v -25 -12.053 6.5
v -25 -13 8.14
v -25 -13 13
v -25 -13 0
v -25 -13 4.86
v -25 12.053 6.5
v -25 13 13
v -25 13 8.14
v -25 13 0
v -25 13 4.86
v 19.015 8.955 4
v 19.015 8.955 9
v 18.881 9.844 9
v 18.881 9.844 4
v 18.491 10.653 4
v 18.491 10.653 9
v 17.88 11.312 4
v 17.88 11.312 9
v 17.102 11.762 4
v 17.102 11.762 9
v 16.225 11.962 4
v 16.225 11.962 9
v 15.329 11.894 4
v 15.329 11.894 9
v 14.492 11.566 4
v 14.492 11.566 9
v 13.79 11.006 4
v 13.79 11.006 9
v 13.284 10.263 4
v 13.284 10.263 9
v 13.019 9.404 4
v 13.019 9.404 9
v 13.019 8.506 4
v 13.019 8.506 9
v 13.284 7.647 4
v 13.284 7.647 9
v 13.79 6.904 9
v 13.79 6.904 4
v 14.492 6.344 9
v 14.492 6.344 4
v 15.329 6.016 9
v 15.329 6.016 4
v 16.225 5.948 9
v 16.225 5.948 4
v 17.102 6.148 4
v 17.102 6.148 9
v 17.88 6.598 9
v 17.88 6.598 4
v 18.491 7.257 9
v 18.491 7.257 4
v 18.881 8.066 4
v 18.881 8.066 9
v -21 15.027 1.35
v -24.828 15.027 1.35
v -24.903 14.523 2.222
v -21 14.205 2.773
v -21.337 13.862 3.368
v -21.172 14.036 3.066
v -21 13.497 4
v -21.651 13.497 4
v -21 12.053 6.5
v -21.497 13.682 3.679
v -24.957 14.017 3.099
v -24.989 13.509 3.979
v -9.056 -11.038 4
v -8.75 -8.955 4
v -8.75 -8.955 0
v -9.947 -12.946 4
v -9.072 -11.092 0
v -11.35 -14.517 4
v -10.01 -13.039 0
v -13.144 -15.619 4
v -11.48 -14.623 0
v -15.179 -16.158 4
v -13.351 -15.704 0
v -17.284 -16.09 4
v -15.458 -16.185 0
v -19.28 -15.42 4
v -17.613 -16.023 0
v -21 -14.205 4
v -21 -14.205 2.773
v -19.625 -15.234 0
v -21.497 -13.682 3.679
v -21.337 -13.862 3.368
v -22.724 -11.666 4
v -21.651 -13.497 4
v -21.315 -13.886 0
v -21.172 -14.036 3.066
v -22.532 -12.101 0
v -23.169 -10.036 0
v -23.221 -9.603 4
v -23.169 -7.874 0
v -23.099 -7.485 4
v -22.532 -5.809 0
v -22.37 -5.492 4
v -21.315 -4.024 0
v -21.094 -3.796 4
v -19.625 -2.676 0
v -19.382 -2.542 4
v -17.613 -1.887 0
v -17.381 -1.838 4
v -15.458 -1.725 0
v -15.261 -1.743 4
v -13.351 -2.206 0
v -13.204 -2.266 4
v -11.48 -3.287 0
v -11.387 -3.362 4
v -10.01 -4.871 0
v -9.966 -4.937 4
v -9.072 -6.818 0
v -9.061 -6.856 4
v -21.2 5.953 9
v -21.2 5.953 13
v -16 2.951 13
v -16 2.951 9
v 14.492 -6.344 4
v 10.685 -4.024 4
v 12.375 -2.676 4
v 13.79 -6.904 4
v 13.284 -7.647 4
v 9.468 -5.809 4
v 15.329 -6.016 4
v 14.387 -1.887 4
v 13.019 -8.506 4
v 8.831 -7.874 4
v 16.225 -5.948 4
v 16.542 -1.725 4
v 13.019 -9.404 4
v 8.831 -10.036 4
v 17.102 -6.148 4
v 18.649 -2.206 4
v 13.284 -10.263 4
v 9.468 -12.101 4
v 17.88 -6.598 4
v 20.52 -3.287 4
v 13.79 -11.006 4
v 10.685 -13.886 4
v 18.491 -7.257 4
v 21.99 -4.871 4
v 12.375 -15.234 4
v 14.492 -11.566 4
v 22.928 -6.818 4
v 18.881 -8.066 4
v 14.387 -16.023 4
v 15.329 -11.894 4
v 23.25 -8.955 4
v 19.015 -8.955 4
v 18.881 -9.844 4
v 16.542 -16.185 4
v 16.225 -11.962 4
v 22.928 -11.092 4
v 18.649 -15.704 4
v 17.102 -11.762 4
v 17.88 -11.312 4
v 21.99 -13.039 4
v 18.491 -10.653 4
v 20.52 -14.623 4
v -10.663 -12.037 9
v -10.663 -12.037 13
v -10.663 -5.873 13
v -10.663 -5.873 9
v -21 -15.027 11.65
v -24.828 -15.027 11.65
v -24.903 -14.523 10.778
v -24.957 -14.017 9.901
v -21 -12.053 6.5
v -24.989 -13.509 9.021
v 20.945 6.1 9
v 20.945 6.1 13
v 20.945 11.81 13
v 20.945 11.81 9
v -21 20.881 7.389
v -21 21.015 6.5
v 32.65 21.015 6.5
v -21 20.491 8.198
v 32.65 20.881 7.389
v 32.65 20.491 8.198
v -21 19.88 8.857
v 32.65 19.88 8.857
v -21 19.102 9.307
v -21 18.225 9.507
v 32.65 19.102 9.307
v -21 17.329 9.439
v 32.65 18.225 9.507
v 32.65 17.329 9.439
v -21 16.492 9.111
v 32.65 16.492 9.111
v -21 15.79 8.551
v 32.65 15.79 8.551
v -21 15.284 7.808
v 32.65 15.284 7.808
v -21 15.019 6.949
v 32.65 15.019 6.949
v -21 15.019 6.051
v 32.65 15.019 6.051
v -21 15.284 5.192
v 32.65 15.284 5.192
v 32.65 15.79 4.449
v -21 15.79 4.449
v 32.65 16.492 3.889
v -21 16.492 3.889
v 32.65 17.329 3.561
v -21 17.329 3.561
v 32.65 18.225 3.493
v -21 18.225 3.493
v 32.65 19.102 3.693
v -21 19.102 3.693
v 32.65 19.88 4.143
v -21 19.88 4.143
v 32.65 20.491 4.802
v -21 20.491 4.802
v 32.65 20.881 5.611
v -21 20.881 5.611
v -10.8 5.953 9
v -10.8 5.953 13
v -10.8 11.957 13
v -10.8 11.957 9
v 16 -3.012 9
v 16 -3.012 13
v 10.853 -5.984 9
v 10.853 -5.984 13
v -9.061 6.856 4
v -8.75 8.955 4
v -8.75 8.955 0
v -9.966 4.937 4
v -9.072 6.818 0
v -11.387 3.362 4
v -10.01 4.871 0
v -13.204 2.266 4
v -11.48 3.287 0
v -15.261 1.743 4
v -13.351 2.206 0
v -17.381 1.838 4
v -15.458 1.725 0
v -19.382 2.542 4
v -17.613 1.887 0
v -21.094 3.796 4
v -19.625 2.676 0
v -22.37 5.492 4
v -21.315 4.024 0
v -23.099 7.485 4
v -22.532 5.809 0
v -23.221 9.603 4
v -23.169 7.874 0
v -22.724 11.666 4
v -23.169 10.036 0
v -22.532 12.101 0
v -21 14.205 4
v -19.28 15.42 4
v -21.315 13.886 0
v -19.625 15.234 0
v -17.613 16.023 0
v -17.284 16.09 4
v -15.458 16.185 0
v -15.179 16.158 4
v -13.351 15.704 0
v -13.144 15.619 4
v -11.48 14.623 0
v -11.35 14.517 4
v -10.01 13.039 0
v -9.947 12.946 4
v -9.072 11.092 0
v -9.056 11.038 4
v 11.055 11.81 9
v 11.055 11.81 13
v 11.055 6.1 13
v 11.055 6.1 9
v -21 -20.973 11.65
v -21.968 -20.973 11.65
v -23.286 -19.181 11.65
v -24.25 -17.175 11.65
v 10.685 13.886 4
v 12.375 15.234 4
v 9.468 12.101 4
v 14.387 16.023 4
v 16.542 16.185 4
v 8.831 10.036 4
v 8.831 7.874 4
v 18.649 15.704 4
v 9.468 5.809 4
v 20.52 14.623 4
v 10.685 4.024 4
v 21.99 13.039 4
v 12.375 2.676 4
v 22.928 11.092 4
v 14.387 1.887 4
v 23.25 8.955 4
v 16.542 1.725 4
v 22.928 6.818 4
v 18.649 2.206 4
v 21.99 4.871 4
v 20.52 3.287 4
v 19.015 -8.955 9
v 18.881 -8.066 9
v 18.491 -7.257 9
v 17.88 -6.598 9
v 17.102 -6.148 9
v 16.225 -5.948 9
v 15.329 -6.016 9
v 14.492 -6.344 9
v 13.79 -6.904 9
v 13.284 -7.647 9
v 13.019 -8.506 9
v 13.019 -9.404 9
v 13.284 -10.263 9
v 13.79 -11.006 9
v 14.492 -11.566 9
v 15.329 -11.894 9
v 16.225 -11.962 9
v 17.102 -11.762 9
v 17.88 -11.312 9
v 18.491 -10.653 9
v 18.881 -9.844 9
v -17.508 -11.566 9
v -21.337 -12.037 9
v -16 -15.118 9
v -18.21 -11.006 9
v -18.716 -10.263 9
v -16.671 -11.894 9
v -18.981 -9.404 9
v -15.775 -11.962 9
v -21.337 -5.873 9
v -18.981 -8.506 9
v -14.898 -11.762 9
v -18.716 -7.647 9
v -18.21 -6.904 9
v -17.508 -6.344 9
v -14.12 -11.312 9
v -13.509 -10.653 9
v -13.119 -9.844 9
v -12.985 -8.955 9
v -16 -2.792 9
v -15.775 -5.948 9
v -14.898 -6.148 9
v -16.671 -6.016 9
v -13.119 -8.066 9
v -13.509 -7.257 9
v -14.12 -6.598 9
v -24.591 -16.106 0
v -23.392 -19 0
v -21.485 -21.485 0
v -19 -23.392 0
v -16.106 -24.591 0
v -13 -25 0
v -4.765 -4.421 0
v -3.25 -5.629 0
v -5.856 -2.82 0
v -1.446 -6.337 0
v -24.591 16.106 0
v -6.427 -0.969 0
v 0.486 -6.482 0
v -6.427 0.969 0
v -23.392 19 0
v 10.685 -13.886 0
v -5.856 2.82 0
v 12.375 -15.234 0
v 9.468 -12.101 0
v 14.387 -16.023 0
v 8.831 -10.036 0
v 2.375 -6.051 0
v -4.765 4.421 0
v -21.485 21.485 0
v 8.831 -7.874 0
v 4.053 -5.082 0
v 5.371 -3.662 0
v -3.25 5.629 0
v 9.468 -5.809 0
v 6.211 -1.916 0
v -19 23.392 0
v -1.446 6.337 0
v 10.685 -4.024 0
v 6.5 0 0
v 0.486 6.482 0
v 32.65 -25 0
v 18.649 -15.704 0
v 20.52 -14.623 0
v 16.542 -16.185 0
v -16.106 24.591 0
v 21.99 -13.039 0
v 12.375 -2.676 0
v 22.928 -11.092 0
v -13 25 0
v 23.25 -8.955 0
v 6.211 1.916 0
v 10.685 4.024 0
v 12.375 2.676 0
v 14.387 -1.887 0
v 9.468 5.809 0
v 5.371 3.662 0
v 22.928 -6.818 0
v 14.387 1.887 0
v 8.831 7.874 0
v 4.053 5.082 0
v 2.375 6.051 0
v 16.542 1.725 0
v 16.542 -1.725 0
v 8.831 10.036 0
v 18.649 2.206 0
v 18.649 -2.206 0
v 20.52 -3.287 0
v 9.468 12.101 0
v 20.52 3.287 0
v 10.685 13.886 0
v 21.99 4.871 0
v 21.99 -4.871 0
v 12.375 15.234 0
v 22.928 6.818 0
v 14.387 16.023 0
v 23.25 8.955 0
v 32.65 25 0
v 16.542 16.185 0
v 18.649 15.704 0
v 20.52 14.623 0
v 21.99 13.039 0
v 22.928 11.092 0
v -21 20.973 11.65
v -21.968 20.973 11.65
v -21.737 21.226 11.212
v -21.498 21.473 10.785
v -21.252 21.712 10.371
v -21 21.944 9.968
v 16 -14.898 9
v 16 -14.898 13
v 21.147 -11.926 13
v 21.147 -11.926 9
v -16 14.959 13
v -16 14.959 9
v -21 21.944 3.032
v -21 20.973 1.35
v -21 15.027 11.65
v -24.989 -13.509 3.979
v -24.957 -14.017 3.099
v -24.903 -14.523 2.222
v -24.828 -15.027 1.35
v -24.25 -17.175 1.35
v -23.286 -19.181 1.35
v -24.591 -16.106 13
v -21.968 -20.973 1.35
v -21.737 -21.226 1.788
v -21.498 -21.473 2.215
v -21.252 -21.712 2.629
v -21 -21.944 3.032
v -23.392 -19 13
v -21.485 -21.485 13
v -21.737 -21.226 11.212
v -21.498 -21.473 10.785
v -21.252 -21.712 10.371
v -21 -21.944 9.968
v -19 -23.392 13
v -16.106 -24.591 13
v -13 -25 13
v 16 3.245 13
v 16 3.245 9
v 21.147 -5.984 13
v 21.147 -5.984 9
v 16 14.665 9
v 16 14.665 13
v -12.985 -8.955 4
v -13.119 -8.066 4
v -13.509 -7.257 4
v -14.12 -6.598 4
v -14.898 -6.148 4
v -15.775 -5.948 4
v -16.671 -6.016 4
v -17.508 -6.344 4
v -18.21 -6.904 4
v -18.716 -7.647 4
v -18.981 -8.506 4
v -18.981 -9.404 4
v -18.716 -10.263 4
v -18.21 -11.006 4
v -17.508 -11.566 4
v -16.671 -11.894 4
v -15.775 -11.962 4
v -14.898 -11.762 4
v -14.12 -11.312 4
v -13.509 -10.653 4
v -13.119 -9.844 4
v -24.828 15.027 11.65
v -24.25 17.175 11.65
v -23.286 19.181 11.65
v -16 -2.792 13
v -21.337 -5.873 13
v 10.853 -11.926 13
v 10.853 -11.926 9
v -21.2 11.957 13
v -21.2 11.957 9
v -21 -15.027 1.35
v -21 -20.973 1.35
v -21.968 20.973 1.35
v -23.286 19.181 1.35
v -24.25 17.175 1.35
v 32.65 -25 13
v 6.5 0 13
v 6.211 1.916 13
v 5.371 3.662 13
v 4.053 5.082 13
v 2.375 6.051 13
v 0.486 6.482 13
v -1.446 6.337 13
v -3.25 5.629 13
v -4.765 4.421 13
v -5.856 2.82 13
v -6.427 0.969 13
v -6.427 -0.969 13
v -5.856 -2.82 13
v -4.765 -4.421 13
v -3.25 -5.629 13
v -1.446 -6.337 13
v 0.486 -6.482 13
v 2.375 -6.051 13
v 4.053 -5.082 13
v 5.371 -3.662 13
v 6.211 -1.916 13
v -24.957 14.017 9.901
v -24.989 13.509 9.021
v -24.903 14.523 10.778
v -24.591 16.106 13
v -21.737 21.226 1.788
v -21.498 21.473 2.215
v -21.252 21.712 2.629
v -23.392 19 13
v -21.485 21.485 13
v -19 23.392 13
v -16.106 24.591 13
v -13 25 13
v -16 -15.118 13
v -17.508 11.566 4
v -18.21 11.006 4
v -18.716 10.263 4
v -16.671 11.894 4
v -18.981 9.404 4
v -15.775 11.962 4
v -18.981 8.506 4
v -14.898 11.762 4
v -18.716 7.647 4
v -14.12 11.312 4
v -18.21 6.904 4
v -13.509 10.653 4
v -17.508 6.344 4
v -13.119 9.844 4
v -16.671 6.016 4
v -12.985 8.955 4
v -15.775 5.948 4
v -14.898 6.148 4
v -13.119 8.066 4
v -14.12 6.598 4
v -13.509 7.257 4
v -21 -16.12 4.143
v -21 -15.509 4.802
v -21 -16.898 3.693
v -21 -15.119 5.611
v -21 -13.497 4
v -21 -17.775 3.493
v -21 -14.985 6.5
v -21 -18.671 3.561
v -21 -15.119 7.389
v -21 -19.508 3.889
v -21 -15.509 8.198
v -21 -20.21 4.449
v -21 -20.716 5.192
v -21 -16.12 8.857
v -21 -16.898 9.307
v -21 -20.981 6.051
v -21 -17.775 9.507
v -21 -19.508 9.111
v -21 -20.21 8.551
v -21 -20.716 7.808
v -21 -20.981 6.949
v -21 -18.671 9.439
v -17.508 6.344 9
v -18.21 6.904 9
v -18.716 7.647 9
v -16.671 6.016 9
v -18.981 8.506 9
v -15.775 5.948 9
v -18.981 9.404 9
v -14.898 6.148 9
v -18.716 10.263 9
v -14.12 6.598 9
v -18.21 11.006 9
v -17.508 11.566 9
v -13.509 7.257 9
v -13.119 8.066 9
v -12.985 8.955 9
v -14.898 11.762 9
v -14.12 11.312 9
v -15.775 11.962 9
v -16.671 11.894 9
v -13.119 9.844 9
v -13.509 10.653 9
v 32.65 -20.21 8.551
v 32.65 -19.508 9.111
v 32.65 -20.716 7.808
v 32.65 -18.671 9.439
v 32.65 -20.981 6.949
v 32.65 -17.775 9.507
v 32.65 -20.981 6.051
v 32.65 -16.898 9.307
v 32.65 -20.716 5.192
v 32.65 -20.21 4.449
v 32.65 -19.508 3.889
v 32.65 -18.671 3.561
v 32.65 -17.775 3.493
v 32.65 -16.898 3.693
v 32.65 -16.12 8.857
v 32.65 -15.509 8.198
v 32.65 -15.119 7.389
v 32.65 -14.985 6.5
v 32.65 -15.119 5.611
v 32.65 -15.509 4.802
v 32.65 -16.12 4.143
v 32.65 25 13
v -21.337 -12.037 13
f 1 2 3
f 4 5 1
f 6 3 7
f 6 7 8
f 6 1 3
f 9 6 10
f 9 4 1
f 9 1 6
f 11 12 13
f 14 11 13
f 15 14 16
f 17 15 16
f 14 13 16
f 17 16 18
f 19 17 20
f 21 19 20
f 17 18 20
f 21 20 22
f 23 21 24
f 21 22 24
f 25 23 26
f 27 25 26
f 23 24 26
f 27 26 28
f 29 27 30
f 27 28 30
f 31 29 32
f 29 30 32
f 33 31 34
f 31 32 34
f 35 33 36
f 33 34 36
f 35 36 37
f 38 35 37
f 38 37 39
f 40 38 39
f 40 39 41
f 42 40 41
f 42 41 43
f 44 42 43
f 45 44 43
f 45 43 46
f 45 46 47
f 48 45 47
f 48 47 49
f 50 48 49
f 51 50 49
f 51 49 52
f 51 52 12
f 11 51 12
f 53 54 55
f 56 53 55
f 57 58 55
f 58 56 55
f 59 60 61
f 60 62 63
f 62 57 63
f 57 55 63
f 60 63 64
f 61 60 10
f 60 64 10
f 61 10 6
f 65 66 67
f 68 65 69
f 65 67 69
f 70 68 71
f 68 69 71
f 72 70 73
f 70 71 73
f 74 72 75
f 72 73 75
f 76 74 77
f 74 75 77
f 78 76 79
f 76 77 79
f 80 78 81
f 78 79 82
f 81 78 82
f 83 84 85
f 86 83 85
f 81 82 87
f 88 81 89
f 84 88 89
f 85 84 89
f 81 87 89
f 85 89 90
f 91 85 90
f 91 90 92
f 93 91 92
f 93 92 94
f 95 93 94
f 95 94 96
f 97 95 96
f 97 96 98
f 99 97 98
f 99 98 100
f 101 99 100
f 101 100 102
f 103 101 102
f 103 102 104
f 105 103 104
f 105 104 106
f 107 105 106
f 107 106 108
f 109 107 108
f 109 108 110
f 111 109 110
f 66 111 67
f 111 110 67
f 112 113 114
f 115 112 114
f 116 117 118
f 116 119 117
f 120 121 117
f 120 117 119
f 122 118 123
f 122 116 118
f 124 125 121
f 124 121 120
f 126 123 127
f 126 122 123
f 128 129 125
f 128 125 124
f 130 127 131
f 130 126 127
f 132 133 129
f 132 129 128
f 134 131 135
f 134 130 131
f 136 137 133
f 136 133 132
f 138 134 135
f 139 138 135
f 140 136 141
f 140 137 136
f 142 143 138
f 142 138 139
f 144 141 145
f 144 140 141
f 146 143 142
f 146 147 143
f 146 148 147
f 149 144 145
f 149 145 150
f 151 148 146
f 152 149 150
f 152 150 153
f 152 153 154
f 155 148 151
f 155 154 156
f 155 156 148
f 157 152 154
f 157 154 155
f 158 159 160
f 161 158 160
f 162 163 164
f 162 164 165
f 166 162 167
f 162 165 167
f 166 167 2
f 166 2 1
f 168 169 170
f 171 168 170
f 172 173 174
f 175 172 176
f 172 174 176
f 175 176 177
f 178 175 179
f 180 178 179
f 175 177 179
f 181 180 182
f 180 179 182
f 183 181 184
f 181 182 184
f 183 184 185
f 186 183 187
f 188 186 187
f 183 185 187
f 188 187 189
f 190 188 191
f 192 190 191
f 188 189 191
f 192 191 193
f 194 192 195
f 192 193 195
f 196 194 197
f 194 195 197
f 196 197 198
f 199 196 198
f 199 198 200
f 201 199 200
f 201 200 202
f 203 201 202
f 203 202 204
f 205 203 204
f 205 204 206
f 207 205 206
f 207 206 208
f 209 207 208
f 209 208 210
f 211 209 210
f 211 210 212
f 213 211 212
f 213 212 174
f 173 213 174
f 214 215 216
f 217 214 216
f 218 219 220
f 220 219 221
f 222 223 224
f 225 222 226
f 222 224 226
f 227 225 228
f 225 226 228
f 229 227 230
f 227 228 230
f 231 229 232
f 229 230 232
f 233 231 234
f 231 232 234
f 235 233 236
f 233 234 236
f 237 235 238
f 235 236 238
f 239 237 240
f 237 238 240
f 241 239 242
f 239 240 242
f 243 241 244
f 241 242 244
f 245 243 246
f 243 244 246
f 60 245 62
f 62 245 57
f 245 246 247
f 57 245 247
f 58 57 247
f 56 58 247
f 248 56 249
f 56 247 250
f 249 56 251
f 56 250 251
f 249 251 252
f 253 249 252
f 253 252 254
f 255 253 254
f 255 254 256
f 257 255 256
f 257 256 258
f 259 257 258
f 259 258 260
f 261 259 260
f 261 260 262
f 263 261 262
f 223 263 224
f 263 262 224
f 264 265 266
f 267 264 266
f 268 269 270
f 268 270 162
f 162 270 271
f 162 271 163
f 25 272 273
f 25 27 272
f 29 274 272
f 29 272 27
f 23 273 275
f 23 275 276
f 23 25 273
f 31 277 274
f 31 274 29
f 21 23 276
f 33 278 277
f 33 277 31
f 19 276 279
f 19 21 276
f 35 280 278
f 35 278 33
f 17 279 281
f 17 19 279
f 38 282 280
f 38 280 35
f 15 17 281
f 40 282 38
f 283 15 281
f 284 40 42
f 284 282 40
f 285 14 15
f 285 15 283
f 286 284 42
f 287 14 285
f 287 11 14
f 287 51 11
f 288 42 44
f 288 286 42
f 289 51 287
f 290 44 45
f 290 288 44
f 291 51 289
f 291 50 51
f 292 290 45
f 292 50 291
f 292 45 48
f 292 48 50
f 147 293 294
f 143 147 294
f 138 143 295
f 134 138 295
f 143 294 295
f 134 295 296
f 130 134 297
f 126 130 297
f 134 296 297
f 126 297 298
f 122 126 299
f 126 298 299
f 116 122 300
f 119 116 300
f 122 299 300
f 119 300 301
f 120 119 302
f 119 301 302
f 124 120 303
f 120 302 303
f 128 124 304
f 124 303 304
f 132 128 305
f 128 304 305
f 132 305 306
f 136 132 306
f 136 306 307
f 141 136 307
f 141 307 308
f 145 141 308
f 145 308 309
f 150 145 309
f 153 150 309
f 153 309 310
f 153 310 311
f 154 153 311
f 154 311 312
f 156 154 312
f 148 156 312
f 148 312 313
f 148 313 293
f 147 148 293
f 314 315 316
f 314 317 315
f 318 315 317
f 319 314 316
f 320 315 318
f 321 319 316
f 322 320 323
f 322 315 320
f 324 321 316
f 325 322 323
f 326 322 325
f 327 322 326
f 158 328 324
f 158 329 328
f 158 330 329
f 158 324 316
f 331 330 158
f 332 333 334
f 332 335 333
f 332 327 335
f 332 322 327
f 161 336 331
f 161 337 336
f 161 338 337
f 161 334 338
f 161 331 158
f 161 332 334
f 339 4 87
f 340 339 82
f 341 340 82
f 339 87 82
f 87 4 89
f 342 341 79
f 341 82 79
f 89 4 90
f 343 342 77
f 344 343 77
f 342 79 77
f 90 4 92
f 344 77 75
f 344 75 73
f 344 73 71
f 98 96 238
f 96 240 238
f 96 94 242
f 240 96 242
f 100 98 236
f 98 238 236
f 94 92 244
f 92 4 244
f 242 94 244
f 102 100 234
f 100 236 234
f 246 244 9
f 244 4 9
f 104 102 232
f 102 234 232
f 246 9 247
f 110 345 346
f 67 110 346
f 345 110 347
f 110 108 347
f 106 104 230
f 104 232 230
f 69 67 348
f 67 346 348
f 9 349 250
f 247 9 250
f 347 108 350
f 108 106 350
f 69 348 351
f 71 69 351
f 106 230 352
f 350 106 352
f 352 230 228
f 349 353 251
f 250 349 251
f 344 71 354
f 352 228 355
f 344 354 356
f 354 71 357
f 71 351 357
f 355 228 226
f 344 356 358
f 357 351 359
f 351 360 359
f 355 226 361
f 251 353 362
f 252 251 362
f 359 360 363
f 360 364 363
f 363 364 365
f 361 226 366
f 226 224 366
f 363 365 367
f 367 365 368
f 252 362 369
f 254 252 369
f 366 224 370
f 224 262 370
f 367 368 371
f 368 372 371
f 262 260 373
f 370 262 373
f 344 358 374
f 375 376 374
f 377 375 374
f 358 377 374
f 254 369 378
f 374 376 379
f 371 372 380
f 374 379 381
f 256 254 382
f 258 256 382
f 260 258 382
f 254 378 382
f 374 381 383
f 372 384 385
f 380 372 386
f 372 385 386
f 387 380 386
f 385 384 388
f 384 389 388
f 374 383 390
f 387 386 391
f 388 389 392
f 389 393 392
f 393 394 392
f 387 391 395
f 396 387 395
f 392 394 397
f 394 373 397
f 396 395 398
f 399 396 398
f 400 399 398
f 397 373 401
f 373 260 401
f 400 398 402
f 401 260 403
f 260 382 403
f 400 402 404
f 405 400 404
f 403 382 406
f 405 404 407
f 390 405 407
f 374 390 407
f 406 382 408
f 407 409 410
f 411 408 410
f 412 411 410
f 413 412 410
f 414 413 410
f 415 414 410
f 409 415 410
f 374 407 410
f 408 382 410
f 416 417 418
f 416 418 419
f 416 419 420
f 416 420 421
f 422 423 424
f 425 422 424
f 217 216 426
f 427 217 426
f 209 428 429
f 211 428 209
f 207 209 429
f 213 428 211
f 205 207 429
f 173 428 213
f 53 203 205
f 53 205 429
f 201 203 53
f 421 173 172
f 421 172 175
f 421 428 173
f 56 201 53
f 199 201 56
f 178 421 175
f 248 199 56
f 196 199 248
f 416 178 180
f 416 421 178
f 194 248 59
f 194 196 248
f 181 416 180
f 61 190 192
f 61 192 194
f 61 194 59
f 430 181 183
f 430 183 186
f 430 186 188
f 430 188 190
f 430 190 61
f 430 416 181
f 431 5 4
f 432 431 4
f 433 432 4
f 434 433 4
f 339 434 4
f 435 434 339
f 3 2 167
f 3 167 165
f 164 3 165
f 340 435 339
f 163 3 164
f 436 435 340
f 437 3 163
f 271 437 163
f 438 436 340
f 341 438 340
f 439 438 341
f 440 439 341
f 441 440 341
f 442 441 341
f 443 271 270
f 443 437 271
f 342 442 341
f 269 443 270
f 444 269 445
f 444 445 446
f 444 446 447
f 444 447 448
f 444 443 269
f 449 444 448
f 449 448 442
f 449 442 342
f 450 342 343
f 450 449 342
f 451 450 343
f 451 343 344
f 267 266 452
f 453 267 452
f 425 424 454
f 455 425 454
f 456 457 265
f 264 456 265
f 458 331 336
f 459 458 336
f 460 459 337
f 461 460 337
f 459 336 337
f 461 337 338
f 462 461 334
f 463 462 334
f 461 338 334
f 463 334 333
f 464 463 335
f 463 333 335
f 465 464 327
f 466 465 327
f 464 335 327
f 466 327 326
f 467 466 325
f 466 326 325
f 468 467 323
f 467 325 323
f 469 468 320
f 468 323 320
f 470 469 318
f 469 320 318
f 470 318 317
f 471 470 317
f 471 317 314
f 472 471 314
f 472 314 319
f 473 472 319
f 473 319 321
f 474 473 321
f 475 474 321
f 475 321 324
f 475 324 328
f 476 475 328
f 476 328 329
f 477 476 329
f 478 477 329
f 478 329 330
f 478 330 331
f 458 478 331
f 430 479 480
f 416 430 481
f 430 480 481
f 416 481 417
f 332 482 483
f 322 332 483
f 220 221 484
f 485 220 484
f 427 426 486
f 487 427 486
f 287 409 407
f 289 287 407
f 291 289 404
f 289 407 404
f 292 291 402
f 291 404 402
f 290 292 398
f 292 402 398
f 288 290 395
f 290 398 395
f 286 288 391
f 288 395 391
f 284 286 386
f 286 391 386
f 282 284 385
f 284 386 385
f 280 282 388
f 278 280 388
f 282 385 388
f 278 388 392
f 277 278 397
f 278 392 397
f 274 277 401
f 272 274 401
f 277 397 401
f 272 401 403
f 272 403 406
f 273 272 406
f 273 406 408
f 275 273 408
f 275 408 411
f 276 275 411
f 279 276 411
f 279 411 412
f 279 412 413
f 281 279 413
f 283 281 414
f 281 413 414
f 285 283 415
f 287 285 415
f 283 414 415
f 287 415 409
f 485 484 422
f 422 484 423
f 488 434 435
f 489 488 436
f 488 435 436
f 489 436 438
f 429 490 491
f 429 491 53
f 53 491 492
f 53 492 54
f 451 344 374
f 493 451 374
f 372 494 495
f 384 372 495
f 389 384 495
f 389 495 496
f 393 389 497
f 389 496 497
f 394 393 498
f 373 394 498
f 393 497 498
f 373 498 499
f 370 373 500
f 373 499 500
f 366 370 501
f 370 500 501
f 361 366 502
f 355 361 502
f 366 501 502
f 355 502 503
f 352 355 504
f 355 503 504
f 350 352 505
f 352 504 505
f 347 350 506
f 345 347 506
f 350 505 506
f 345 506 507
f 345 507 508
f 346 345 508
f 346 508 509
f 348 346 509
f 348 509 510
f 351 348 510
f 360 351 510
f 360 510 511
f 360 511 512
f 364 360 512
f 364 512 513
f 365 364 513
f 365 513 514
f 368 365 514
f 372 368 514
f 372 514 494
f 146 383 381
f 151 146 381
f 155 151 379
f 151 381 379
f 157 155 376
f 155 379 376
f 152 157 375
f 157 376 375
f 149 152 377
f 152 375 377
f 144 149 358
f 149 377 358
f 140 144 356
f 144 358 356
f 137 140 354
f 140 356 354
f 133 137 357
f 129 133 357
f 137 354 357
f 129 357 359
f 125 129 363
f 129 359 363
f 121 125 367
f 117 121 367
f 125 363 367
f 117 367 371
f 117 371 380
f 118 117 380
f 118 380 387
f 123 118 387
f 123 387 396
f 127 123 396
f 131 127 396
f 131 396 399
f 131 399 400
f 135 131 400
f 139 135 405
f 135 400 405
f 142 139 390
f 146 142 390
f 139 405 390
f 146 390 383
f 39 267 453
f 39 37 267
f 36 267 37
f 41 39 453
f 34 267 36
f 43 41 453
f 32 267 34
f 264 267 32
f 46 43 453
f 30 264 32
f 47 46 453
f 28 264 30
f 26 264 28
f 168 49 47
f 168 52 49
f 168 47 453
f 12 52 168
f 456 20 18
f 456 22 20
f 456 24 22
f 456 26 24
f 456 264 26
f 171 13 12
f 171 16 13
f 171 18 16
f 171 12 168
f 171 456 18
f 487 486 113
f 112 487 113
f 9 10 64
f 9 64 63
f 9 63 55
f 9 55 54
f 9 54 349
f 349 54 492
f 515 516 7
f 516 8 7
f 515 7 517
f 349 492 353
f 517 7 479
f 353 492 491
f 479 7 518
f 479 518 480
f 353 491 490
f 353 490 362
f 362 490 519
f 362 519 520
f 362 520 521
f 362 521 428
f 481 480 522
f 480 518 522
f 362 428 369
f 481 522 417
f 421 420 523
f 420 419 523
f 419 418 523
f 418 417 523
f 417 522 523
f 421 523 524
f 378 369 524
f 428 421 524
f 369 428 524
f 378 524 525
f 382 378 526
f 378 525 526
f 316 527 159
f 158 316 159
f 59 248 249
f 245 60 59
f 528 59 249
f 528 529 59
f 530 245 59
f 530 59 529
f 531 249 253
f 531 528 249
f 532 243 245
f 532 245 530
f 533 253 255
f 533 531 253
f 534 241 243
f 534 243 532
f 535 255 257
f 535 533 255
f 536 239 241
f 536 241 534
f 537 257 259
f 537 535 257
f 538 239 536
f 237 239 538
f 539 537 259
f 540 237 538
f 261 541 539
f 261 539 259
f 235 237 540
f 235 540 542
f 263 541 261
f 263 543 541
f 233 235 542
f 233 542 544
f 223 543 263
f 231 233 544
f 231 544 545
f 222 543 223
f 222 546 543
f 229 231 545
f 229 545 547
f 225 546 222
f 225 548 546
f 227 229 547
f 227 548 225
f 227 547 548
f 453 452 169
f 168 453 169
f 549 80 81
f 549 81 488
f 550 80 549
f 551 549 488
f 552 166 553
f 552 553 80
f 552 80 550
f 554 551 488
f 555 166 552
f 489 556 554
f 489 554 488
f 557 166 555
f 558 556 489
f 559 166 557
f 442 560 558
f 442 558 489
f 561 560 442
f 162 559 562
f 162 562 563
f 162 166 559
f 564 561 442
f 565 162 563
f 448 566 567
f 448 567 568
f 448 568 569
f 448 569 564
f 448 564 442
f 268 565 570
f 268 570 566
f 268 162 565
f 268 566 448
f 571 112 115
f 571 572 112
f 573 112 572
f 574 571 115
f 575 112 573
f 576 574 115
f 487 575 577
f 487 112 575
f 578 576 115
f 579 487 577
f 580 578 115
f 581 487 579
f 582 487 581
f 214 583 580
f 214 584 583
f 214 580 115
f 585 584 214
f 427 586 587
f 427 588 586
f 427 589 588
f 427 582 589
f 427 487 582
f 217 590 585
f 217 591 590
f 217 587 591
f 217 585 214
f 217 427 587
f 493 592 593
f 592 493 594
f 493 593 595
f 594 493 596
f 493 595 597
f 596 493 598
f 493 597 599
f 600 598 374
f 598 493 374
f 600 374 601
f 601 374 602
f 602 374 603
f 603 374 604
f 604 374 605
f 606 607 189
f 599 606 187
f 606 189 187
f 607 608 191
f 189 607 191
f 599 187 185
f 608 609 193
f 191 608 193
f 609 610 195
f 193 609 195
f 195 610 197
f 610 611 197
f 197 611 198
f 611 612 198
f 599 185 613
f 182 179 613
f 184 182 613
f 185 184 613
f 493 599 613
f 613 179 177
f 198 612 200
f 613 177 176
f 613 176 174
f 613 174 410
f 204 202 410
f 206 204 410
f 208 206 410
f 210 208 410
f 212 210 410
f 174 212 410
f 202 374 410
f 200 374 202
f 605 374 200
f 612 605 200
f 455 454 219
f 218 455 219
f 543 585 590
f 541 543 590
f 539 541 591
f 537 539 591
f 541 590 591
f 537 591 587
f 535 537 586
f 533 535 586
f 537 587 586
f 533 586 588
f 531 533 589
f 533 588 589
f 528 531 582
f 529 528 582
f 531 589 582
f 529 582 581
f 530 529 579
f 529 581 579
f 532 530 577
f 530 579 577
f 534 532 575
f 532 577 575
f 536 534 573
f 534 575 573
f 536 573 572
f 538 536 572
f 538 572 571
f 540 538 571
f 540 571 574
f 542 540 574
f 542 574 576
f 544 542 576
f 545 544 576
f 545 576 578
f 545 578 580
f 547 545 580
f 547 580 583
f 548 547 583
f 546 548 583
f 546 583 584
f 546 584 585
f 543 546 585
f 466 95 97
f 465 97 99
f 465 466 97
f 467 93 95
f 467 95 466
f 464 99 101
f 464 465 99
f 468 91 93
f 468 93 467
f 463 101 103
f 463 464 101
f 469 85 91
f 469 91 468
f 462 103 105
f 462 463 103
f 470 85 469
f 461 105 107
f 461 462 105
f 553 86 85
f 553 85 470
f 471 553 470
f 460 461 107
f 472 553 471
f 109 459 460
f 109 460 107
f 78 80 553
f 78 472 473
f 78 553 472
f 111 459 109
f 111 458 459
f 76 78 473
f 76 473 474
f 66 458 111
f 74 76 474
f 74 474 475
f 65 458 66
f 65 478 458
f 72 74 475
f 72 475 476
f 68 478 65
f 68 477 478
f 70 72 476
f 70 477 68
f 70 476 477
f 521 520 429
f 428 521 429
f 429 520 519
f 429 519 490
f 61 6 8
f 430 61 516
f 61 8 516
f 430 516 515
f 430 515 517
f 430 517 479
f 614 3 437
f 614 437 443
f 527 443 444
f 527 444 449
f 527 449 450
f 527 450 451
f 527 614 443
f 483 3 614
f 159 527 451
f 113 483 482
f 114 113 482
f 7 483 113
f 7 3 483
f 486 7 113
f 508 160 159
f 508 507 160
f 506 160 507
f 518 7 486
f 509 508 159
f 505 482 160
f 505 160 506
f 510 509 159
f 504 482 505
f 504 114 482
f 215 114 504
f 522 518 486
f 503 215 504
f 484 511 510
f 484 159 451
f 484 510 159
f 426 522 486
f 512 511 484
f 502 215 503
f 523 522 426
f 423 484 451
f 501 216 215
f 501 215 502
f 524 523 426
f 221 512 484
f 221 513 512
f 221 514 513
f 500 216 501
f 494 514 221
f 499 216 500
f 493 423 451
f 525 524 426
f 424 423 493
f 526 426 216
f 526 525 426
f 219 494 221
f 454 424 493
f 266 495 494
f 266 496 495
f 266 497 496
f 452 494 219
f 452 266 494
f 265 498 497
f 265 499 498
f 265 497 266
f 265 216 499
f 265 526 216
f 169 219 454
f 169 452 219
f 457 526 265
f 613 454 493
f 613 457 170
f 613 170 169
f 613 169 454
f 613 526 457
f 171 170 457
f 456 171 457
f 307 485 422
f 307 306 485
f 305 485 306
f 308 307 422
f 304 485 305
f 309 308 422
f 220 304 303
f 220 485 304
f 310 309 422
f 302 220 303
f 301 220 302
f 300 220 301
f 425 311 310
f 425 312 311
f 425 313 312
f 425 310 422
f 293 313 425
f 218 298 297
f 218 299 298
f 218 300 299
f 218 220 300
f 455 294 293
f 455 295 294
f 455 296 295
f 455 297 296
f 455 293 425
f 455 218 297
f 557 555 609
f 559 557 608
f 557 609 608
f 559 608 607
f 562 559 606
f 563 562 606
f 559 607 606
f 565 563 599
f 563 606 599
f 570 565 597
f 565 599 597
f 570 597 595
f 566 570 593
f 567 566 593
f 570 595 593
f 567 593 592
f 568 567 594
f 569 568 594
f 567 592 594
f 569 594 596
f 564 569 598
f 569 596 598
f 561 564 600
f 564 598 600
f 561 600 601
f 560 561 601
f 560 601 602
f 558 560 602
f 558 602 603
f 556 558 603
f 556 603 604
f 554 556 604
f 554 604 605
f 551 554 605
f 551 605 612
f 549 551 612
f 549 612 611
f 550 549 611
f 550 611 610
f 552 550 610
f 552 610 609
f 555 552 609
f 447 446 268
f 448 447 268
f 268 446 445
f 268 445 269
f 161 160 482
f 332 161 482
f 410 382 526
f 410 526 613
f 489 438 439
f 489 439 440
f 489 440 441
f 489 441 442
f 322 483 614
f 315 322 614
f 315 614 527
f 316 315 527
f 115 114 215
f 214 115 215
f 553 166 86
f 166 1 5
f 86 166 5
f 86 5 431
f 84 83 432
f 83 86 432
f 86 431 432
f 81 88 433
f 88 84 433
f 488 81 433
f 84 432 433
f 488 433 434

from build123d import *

# Parameters (mm, degrees)
SKETCH008_W     = 57.65
SKETCH008_H     = 50
PAD_DEPTH       = 13
SKETCH009_R     = 3.015
POCKET_DEPTH    = 23.501
FILLET_R        = 12
SKETCH_R        = 6.5
POCKET001_DEPTH = 13.001
POCKET002_DEPTH = 4
SKETCH011_R     = 7.25
POCKET003_DEPTH = 4
SKETCH012_R     = 3.015
POCKET004_DEPTH = 57.651
POCKET005_DEPTH = 4


with BuildPart() as part:
    # Sketch008 → Pad (new body)
    with BuildSketch(Plane.XY):
        with Locations((3.825, 0)):
            Rectangle(SKETCH008_W, SKETCH008_H)
    extrude(amount=PAD_DEPTH)

    # Sketch009 → Pocket (cut, through all)
    with BuildSketch(Plane.XY.offset(23.5)):
        with Locations((-16, 8.955)):
            Circle(SKETCH009_R)
        with Locations((-16, -8.955)):
            Circle(SKETCH009_R)
        with Locations((16, 8.955)):
            Circle(SKETCH009_R)
        with Locations((16, -8.955)):
            Circle(SKETCH009_R)
    extrude(amount=-POCKET_DEPTH, mode=Mode.SUBTRACT)

    # Fillet
    fillet_edges = [part.edges().sort_by_distance(p)[0] for p in [
        (-25, 25, 6.5),
        (-25, -25, 6.5),
    ]]
    fillet(fillet_edges, radius=FILLET_R)

    # Sketch (on Face5 of Fillet) → Pocket001 (cut, through all)
    with BuildSketch(Plane.XY.offset(13)):
        Circle(SKETCH_R)
    extrude(amount=-POCKET001_DEPTH, mode=Mode.SUBTRACT)

    # Sketch010 (on Face5 of Pocket001) → Pocket002 (cut)
    with BuildSketch(Plane.XY.offset(13)):
        Polygon((-10.8, 11.957221), (-16, 14.959443), (-21.2, 11.957221), (-21.2, 5.952779), (-16, 2.950557), (-10.8, 5.952779), align=None)
        Polygon((20.944817, 11.809891), (16, 14.664783), (11.055183, 11.809891), (11.055183, 6.100109), (16, 3.245217), (20.944817, 6.100109), align=None)
        Polygon((-10.662676, -5.873494), (-16, -2.791989), (-21.337324, -5.873494), (-21.337324, -12.036506), (-16, -15.118011), (-10.662676, -12.036506), align=None)
        Polygon((21.146526, -5.983652), (16, -3.012303), (10.853474, -5.983652), (10.853474, -11.926348), (16, -14.897697), (21.146526, -11.926348), align=None)
    extrude(amount=-POCKET002_DEPTH, mode=Mode.SUBTRACT)

    # Sketch011 (on Face2 of Pocket002) → Pocket003 (cut)
    with BuildSketch(Plane(origin=(0, 0, 0), x_dir=(1, 0, 0), z_dir=(0, 0, -1))):
        with Locations((-16, 8.955)):
            Circle(SKETCH011_R)
        with Locations((16, 8.955)):
            Circle(SKETCH011_R)
        with Locations((-16, -8.955)):
            Circle(SKETCH011_R)
        with Locations((16, -8.955)):
            Circle(SKETCH011_R)
    extrude(amount=-POCKET003_DEPTH, mode=Mode.SUBTRACT)

    # Sketch012 (on Face4 of Pocket003) → Pocket004 (cut, through all)
    with BuildSketch(Plane.YZ.offset(32.65)):
        with Locations((18, 6.5)):
            Circle(SKETCH012_R)
        with Locations((-18, 6.5)):
            Circle(SKETCH012_R)
    extrude(amount=-POCKET004_DEPTH, mode=Mode.SUBTRACT)

    # Sketch013 (on Face6 of Pocket004) → Pocket005 (cut)
    with BuildSketch(Plane(origin=(-25, 0, 0), x_dir=(0, -1, 0), z_dir=(-1, 0, 0))):
        Polygon((-12.053292, 6.5), (-15.026646, 11.65), (-20.973354, 11.65), (-23.946708, 6.5), (-20.973354, 1.35), (-15.026646, 1.35), align=None)
        Polygon((23.946708, 6.5), (20.973354, 11.65), (15.026646, 11.65), (12.053292, 6.5), (15.026646, 1.35), (20.973354, 1.35), align=None)
    extrude(amount=-POCKET005_DEPTH, mode=Mode.SUBTRACT)


solid = part.part
